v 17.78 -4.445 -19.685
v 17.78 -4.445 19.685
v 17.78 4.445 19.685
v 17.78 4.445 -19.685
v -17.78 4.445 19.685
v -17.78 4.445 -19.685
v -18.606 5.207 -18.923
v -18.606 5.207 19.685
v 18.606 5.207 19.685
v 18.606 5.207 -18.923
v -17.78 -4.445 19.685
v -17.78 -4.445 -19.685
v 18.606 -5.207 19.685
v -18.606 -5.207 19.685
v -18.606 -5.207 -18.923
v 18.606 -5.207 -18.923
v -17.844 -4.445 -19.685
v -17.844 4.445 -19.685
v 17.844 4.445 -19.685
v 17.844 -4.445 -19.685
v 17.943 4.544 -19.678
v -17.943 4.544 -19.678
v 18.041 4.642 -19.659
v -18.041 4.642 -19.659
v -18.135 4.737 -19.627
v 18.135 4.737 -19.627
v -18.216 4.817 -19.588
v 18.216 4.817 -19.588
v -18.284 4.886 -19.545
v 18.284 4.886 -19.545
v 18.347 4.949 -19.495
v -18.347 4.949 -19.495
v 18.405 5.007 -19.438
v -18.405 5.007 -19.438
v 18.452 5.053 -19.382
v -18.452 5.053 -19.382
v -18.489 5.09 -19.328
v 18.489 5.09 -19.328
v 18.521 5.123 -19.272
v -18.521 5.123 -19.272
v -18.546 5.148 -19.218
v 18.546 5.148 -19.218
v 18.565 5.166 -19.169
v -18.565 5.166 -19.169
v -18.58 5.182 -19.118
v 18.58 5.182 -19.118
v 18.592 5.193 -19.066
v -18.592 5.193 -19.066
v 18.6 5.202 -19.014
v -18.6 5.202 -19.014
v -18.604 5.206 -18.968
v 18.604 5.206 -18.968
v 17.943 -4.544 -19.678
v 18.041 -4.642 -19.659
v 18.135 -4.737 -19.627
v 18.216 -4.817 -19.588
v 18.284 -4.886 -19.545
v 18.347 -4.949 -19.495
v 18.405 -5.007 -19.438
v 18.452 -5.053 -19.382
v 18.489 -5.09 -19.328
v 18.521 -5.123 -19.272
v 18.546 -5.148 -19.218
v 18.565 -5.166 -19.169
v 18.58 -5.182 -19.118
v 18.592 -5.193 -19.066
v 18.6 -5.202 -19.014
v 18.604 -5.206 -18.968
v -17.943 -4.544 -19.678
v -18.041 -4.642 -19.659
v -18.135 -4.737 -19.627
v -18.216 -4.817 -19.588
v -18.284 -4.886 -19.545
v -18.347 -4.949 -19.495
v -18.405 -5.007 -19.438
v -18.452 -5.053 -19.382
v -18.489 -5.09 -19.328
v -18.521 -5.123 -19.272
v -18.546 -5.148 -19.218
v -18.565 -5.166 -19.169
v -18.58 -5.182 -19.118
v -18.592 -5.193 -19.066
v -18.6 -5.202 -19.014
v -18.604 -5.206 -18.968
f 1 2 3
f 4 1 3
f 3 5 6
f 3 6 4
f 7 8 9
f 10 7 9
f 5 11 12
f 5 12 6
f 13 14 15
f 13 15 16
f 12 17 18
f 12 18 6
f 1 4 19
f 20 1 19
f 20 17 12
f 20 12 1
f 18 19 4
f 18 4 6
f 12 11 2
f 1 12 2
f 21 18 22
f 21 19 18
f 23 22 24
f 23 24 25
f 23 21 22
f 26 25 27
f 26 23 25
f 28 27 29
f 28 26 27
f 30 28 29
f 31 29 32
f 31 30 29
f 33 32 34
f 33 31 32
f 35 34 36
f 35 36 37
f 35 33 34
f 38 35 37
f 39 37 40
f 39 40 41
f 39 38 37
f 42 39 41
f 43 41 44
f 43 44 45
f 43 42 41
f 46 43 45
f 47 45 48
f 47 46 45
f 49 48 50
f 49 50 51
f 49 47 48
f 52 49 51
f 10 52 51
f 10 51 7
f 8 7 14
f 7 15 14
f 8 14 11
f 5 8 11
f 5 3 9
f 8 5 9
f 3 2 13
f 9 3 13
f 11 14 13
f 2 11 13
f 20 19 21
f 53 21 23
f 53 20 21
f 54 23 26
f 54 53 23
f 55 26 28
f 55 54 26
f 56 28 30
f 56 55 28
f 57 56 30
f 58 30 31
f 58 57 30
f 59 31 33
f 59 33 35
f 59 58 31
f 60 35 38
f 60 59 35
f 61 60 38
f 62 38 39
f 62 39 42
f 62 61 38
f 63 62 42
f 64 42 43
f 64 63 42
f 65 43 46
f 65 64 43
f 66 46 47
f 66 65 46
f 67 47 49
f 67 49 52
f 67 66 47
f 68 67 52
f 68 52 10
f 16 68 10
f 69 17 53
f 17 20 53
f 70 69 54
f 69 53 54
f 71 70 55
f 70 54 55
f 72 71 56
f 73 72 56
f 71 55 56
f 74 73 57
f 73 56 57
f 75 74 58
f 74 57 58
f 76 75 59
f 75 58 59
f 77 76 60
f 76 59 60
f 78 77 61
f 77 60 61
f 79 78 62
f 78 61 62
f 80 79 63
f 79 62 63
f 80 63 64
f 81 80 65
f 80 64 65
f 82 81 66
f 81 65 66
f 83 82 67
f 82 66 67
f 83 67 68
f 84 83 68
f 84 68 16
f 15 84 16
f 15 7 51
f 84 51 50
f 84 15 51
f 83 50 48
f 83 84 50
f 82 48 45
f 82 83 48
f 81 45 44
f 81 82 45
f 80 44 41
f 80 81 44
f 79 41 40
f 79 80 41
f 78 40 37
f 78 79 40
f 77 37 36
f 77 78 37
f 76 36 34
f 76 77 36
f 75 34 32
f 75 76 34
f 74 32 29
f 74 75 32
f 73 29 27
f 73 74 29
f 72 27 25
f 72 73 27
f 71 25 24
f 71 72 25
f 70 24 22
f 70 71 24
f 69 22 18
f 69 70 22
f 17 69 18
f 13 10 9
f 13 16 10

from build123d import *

# Parameters (mm, degrees)
F0_W     = 37.211
F0_H     = 39.37
F1_DEPTH = 5.207
F2_W     = 35.56
F2_H     = 8.89
F3_DEPTH = 39.37
F4_R     = 0.76199


# Not quite as in the source:
# - a fillet or chamfer is up to 0.001 mm smaller than in the source, because OpenCascade refuses the exact size


with BuildPart() as f1:
    # F0 (on Front) → F1 (new body, symmetric)
    with BuildSketch(Plane.XZ):
        Rectangle(F0_W, F0_H)
    extrude(amount=F1_DEPTH, both=True)

    # F2 (on face) → F3 (cut)
    with BuildSketch(Plane.XY.offset(19.685)):
        Rectangle(F2_W, F2_H)
    extrude(amount=-F3_DEPTH, mode=Mode.SUBTRACT)

    # F4 (radius 0.762 in the source; OpenCascade refuses exactly that, so slightly less here)
    f4_edges = [f1.edges().sort_by_distance(p)[0] for p in [
        (18.6055, 0, -19.685),
        (0, -5.207, -19.685),
        (0, 5.207, -19.685),
        (-18.6055, 0, -19.685),
    ]]
    fillet(f4_edges, radius=F4_R)


solid = f1.part
